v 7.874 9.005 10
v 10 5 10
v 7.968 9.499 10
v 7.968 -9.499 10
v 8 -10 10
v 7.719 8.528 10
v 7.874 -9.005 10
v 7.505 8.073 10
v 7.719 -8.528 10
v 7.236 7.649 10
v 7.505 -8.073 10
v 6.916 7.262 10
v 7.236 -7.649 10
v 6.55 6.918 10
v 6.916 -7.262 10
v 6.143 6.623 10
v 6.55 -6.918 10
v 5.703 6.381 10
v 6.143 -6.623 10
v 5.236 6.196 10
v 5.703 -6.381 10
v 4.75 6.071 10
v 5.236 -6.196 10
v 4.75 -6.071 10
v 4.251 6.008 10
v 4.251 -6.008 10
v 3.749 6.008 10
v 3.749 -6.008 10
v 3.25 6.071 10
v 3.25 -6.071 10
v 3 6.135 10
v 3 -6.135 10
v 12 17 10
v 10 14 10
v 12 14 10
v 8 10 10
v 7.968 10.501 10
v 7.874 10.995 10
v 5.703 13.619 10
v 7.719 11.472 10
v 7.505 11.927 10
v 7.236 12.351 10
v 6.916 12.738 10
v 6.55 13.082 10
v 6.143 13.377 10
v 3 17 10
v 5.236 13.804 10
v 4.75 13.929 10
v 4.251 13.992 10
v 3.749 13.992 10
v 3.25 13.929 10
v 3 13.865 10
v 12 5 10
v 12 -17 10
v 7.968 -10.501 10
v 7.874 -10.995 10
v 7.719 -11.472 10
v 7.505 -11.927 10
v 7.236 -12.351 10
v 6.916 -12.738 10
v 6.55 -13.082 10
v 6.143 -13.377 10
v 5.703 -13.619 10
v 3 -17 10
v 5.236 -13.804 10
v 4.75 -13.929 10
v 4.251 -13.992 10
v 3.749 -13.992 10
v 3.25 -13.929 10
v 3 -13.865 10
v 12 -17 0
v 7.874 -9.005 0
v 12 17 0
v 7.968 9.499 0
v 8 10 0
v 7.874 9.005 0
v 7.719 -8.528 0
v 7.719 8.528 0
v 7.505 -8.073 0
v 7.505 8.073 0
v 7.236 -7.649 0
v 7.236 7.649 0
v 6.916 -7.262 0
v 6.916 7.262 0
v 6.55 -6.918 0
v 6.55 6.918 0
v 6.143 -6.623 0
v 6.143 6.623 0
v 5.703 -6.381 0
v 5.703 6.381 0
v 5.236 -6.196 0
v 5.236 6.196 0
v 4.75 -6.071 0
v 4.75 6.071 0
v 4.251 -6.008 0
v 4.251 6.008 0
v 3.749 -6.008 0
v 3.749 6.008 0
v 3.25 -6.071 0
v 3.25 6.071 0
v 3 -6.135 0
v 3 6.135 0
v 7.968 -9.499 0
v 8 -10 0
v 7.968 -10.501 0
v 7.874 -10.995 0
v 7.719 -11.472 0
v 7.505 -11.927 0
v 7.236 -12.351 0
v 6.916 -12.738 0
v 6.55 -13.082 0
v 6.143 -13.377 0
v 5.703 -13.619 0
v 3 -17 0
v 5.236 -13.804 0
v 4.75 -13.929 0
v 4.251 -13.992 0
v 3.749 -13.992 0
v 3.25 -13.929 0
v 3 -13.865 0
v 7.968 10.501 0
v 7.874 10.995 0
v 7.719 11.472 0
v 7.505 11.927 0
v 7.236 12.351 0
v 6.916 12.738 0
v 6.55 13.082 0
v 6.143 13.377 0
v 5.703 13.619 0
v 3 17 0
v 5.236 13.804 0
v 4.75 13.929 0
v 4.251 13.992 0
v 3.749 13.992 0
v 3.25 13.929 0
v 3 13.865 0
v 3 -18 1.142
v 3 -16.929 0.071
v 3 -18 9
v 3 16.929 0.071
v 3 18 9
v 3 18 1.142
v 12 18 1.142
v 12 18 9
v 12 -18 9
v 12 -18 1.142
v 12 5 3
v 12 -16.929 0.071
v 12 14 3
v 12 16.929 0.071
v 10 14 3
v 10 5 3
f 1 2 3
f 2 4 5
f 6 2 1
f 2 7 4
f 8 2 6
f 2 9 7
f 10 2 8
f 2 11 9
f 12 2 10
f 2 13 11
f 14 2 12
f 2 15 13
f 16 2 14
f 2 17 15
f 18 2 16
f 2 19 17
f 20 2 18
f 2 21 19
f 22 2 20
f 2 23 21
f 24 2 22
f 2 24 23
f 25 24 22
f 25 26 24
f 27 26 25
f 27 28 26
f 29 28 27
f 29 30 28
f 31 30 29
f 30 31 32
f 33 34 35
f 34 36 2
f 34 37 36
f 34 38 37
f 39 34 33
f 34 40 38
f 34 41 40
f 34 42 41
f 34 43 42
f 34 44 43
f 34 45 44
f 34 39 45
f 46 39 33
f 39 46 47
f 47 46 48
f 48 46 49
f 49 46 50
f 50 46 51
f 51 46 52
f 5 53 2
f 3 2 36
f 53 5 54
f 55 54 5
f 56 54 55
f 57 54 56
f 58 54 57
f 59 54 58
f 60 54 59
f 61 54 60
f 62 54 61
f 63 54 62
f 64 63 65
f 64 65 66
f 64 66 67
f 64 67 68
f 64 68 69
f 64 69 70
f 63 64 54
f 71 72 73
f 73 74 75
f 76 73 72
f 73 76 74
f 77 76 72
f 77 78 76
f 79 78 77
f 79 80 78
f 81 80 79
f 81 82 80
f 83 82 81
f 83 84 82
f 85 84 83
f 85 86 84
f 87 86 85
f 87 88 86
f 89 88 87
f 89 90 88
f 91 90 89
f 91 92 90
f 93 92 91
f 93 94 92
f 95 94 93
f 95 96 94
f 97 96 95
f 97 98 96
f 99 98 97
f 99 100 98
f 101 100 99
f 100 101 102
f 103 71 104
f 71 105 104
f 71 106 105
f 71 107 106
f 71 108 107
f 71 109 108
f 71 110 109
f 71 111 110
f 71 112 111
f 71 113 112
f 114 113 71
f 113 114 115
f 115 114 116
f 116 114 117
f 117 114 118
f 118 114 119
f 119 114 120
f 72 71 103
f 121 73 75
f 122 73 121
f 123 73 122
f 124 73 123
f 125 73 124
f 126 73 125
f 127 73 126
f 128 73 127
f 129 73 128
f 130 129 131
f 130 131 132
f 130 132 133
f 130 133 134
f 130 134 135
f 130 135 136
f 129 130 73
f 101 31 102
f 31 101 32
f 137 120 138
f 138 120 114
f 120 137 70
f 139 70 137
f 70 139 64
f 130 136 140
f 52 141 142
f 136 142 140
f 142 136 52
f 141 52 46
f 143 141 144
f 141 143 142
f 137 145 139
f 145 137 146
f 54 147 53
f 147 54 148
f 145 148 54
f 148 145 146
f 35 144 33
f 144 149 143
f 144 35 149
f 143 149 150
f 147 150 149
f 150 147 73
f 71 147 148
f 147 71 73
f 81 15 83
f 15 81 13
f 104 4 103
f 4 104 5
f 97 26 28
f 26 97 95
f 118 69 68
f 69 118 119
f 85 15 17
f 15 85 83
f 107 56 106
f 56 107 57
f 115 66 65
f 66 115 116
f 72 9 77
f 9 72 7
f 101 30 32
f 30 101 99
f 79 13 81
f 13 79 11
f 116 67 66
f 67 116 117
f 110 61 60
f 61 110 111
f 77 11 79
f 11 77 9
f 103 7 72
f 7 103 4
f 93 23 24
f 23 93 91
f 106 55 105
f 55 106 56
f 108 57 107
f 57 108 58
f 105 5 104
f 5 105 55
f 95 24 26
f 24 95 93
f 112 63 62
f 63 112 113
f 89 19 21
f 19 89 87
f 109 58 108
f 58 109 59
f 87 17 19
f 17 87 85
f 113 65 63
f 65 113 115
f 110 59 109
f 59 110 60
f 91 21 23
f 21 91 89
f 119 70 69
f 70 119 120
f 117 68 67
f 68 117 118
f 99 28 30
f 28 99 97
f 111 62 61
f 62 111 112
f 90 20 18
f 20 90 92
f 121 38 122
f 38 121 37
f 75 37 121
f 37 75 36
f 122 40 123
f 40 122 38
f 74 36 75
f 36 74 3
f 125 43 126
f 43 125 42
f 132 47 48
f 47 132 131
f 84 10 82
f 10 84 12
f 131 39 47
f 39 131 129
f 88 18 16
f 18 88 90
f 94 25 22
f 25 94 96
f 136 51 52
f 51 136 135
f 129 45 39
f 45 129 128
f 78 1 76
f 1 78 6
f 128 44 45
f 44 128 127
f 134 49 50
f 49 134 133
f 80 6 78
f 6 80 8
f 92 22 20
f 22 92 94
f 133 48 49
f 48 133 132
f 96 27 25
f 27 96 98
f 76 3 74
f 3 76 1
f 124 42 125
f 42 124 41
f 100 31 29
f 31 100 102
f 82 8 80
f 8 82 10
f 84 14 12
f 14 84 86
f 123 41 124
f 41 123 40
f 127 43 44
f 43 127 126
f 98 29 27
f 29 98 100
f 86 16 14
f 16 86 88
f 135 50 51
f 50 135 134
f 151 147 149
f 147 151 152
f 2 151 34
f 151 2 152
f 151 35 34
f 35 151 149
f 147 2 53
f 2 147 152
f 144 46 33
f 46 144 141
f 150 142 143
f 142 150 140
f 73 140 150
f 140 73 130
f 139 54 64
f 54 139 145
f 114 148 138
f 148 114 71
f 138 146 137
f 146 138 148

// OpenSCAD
// PRUSA iteration3
// X carriage
// GNU GPL v3
// Josef Průša <iam@josefprusa.cz> and contributors
// http://www.reprap.org/wiki/Prusa_Mendel
// http://prusamendel.org

module y_distance() {
    difference()
    {

    //body    
    union()
    {
        translate([3,-18,0]) cube([5,36,10]);
        translate([8,-18,0]) cube([4,36,10]);
    }


    union()
    {
        //rods
        translate(v = [4,-10,-1]) cylinder(h = 12, r=4, $fn=50);	
        translate(v = [4,10,-1]) cylinder(h = 12, r=4, $fn=50);
        //cables
        translate([10,5,3]) cube([8,9,10]);
    }

            //corners
            translate([-5,24,3]) rotate([45,0,0]) cube([20,10,10]);
            translate([-5,24,-7]) rotate([45,0,0]) cube([20,10,10]);
            translate([-5,-24,3]) rotate([45,0,0]) cube([20,10,10]);
            translate([-5,-24,-7]) rotate([45,0,0]) cube([20,10,10]);
    }
}

y_distance();
